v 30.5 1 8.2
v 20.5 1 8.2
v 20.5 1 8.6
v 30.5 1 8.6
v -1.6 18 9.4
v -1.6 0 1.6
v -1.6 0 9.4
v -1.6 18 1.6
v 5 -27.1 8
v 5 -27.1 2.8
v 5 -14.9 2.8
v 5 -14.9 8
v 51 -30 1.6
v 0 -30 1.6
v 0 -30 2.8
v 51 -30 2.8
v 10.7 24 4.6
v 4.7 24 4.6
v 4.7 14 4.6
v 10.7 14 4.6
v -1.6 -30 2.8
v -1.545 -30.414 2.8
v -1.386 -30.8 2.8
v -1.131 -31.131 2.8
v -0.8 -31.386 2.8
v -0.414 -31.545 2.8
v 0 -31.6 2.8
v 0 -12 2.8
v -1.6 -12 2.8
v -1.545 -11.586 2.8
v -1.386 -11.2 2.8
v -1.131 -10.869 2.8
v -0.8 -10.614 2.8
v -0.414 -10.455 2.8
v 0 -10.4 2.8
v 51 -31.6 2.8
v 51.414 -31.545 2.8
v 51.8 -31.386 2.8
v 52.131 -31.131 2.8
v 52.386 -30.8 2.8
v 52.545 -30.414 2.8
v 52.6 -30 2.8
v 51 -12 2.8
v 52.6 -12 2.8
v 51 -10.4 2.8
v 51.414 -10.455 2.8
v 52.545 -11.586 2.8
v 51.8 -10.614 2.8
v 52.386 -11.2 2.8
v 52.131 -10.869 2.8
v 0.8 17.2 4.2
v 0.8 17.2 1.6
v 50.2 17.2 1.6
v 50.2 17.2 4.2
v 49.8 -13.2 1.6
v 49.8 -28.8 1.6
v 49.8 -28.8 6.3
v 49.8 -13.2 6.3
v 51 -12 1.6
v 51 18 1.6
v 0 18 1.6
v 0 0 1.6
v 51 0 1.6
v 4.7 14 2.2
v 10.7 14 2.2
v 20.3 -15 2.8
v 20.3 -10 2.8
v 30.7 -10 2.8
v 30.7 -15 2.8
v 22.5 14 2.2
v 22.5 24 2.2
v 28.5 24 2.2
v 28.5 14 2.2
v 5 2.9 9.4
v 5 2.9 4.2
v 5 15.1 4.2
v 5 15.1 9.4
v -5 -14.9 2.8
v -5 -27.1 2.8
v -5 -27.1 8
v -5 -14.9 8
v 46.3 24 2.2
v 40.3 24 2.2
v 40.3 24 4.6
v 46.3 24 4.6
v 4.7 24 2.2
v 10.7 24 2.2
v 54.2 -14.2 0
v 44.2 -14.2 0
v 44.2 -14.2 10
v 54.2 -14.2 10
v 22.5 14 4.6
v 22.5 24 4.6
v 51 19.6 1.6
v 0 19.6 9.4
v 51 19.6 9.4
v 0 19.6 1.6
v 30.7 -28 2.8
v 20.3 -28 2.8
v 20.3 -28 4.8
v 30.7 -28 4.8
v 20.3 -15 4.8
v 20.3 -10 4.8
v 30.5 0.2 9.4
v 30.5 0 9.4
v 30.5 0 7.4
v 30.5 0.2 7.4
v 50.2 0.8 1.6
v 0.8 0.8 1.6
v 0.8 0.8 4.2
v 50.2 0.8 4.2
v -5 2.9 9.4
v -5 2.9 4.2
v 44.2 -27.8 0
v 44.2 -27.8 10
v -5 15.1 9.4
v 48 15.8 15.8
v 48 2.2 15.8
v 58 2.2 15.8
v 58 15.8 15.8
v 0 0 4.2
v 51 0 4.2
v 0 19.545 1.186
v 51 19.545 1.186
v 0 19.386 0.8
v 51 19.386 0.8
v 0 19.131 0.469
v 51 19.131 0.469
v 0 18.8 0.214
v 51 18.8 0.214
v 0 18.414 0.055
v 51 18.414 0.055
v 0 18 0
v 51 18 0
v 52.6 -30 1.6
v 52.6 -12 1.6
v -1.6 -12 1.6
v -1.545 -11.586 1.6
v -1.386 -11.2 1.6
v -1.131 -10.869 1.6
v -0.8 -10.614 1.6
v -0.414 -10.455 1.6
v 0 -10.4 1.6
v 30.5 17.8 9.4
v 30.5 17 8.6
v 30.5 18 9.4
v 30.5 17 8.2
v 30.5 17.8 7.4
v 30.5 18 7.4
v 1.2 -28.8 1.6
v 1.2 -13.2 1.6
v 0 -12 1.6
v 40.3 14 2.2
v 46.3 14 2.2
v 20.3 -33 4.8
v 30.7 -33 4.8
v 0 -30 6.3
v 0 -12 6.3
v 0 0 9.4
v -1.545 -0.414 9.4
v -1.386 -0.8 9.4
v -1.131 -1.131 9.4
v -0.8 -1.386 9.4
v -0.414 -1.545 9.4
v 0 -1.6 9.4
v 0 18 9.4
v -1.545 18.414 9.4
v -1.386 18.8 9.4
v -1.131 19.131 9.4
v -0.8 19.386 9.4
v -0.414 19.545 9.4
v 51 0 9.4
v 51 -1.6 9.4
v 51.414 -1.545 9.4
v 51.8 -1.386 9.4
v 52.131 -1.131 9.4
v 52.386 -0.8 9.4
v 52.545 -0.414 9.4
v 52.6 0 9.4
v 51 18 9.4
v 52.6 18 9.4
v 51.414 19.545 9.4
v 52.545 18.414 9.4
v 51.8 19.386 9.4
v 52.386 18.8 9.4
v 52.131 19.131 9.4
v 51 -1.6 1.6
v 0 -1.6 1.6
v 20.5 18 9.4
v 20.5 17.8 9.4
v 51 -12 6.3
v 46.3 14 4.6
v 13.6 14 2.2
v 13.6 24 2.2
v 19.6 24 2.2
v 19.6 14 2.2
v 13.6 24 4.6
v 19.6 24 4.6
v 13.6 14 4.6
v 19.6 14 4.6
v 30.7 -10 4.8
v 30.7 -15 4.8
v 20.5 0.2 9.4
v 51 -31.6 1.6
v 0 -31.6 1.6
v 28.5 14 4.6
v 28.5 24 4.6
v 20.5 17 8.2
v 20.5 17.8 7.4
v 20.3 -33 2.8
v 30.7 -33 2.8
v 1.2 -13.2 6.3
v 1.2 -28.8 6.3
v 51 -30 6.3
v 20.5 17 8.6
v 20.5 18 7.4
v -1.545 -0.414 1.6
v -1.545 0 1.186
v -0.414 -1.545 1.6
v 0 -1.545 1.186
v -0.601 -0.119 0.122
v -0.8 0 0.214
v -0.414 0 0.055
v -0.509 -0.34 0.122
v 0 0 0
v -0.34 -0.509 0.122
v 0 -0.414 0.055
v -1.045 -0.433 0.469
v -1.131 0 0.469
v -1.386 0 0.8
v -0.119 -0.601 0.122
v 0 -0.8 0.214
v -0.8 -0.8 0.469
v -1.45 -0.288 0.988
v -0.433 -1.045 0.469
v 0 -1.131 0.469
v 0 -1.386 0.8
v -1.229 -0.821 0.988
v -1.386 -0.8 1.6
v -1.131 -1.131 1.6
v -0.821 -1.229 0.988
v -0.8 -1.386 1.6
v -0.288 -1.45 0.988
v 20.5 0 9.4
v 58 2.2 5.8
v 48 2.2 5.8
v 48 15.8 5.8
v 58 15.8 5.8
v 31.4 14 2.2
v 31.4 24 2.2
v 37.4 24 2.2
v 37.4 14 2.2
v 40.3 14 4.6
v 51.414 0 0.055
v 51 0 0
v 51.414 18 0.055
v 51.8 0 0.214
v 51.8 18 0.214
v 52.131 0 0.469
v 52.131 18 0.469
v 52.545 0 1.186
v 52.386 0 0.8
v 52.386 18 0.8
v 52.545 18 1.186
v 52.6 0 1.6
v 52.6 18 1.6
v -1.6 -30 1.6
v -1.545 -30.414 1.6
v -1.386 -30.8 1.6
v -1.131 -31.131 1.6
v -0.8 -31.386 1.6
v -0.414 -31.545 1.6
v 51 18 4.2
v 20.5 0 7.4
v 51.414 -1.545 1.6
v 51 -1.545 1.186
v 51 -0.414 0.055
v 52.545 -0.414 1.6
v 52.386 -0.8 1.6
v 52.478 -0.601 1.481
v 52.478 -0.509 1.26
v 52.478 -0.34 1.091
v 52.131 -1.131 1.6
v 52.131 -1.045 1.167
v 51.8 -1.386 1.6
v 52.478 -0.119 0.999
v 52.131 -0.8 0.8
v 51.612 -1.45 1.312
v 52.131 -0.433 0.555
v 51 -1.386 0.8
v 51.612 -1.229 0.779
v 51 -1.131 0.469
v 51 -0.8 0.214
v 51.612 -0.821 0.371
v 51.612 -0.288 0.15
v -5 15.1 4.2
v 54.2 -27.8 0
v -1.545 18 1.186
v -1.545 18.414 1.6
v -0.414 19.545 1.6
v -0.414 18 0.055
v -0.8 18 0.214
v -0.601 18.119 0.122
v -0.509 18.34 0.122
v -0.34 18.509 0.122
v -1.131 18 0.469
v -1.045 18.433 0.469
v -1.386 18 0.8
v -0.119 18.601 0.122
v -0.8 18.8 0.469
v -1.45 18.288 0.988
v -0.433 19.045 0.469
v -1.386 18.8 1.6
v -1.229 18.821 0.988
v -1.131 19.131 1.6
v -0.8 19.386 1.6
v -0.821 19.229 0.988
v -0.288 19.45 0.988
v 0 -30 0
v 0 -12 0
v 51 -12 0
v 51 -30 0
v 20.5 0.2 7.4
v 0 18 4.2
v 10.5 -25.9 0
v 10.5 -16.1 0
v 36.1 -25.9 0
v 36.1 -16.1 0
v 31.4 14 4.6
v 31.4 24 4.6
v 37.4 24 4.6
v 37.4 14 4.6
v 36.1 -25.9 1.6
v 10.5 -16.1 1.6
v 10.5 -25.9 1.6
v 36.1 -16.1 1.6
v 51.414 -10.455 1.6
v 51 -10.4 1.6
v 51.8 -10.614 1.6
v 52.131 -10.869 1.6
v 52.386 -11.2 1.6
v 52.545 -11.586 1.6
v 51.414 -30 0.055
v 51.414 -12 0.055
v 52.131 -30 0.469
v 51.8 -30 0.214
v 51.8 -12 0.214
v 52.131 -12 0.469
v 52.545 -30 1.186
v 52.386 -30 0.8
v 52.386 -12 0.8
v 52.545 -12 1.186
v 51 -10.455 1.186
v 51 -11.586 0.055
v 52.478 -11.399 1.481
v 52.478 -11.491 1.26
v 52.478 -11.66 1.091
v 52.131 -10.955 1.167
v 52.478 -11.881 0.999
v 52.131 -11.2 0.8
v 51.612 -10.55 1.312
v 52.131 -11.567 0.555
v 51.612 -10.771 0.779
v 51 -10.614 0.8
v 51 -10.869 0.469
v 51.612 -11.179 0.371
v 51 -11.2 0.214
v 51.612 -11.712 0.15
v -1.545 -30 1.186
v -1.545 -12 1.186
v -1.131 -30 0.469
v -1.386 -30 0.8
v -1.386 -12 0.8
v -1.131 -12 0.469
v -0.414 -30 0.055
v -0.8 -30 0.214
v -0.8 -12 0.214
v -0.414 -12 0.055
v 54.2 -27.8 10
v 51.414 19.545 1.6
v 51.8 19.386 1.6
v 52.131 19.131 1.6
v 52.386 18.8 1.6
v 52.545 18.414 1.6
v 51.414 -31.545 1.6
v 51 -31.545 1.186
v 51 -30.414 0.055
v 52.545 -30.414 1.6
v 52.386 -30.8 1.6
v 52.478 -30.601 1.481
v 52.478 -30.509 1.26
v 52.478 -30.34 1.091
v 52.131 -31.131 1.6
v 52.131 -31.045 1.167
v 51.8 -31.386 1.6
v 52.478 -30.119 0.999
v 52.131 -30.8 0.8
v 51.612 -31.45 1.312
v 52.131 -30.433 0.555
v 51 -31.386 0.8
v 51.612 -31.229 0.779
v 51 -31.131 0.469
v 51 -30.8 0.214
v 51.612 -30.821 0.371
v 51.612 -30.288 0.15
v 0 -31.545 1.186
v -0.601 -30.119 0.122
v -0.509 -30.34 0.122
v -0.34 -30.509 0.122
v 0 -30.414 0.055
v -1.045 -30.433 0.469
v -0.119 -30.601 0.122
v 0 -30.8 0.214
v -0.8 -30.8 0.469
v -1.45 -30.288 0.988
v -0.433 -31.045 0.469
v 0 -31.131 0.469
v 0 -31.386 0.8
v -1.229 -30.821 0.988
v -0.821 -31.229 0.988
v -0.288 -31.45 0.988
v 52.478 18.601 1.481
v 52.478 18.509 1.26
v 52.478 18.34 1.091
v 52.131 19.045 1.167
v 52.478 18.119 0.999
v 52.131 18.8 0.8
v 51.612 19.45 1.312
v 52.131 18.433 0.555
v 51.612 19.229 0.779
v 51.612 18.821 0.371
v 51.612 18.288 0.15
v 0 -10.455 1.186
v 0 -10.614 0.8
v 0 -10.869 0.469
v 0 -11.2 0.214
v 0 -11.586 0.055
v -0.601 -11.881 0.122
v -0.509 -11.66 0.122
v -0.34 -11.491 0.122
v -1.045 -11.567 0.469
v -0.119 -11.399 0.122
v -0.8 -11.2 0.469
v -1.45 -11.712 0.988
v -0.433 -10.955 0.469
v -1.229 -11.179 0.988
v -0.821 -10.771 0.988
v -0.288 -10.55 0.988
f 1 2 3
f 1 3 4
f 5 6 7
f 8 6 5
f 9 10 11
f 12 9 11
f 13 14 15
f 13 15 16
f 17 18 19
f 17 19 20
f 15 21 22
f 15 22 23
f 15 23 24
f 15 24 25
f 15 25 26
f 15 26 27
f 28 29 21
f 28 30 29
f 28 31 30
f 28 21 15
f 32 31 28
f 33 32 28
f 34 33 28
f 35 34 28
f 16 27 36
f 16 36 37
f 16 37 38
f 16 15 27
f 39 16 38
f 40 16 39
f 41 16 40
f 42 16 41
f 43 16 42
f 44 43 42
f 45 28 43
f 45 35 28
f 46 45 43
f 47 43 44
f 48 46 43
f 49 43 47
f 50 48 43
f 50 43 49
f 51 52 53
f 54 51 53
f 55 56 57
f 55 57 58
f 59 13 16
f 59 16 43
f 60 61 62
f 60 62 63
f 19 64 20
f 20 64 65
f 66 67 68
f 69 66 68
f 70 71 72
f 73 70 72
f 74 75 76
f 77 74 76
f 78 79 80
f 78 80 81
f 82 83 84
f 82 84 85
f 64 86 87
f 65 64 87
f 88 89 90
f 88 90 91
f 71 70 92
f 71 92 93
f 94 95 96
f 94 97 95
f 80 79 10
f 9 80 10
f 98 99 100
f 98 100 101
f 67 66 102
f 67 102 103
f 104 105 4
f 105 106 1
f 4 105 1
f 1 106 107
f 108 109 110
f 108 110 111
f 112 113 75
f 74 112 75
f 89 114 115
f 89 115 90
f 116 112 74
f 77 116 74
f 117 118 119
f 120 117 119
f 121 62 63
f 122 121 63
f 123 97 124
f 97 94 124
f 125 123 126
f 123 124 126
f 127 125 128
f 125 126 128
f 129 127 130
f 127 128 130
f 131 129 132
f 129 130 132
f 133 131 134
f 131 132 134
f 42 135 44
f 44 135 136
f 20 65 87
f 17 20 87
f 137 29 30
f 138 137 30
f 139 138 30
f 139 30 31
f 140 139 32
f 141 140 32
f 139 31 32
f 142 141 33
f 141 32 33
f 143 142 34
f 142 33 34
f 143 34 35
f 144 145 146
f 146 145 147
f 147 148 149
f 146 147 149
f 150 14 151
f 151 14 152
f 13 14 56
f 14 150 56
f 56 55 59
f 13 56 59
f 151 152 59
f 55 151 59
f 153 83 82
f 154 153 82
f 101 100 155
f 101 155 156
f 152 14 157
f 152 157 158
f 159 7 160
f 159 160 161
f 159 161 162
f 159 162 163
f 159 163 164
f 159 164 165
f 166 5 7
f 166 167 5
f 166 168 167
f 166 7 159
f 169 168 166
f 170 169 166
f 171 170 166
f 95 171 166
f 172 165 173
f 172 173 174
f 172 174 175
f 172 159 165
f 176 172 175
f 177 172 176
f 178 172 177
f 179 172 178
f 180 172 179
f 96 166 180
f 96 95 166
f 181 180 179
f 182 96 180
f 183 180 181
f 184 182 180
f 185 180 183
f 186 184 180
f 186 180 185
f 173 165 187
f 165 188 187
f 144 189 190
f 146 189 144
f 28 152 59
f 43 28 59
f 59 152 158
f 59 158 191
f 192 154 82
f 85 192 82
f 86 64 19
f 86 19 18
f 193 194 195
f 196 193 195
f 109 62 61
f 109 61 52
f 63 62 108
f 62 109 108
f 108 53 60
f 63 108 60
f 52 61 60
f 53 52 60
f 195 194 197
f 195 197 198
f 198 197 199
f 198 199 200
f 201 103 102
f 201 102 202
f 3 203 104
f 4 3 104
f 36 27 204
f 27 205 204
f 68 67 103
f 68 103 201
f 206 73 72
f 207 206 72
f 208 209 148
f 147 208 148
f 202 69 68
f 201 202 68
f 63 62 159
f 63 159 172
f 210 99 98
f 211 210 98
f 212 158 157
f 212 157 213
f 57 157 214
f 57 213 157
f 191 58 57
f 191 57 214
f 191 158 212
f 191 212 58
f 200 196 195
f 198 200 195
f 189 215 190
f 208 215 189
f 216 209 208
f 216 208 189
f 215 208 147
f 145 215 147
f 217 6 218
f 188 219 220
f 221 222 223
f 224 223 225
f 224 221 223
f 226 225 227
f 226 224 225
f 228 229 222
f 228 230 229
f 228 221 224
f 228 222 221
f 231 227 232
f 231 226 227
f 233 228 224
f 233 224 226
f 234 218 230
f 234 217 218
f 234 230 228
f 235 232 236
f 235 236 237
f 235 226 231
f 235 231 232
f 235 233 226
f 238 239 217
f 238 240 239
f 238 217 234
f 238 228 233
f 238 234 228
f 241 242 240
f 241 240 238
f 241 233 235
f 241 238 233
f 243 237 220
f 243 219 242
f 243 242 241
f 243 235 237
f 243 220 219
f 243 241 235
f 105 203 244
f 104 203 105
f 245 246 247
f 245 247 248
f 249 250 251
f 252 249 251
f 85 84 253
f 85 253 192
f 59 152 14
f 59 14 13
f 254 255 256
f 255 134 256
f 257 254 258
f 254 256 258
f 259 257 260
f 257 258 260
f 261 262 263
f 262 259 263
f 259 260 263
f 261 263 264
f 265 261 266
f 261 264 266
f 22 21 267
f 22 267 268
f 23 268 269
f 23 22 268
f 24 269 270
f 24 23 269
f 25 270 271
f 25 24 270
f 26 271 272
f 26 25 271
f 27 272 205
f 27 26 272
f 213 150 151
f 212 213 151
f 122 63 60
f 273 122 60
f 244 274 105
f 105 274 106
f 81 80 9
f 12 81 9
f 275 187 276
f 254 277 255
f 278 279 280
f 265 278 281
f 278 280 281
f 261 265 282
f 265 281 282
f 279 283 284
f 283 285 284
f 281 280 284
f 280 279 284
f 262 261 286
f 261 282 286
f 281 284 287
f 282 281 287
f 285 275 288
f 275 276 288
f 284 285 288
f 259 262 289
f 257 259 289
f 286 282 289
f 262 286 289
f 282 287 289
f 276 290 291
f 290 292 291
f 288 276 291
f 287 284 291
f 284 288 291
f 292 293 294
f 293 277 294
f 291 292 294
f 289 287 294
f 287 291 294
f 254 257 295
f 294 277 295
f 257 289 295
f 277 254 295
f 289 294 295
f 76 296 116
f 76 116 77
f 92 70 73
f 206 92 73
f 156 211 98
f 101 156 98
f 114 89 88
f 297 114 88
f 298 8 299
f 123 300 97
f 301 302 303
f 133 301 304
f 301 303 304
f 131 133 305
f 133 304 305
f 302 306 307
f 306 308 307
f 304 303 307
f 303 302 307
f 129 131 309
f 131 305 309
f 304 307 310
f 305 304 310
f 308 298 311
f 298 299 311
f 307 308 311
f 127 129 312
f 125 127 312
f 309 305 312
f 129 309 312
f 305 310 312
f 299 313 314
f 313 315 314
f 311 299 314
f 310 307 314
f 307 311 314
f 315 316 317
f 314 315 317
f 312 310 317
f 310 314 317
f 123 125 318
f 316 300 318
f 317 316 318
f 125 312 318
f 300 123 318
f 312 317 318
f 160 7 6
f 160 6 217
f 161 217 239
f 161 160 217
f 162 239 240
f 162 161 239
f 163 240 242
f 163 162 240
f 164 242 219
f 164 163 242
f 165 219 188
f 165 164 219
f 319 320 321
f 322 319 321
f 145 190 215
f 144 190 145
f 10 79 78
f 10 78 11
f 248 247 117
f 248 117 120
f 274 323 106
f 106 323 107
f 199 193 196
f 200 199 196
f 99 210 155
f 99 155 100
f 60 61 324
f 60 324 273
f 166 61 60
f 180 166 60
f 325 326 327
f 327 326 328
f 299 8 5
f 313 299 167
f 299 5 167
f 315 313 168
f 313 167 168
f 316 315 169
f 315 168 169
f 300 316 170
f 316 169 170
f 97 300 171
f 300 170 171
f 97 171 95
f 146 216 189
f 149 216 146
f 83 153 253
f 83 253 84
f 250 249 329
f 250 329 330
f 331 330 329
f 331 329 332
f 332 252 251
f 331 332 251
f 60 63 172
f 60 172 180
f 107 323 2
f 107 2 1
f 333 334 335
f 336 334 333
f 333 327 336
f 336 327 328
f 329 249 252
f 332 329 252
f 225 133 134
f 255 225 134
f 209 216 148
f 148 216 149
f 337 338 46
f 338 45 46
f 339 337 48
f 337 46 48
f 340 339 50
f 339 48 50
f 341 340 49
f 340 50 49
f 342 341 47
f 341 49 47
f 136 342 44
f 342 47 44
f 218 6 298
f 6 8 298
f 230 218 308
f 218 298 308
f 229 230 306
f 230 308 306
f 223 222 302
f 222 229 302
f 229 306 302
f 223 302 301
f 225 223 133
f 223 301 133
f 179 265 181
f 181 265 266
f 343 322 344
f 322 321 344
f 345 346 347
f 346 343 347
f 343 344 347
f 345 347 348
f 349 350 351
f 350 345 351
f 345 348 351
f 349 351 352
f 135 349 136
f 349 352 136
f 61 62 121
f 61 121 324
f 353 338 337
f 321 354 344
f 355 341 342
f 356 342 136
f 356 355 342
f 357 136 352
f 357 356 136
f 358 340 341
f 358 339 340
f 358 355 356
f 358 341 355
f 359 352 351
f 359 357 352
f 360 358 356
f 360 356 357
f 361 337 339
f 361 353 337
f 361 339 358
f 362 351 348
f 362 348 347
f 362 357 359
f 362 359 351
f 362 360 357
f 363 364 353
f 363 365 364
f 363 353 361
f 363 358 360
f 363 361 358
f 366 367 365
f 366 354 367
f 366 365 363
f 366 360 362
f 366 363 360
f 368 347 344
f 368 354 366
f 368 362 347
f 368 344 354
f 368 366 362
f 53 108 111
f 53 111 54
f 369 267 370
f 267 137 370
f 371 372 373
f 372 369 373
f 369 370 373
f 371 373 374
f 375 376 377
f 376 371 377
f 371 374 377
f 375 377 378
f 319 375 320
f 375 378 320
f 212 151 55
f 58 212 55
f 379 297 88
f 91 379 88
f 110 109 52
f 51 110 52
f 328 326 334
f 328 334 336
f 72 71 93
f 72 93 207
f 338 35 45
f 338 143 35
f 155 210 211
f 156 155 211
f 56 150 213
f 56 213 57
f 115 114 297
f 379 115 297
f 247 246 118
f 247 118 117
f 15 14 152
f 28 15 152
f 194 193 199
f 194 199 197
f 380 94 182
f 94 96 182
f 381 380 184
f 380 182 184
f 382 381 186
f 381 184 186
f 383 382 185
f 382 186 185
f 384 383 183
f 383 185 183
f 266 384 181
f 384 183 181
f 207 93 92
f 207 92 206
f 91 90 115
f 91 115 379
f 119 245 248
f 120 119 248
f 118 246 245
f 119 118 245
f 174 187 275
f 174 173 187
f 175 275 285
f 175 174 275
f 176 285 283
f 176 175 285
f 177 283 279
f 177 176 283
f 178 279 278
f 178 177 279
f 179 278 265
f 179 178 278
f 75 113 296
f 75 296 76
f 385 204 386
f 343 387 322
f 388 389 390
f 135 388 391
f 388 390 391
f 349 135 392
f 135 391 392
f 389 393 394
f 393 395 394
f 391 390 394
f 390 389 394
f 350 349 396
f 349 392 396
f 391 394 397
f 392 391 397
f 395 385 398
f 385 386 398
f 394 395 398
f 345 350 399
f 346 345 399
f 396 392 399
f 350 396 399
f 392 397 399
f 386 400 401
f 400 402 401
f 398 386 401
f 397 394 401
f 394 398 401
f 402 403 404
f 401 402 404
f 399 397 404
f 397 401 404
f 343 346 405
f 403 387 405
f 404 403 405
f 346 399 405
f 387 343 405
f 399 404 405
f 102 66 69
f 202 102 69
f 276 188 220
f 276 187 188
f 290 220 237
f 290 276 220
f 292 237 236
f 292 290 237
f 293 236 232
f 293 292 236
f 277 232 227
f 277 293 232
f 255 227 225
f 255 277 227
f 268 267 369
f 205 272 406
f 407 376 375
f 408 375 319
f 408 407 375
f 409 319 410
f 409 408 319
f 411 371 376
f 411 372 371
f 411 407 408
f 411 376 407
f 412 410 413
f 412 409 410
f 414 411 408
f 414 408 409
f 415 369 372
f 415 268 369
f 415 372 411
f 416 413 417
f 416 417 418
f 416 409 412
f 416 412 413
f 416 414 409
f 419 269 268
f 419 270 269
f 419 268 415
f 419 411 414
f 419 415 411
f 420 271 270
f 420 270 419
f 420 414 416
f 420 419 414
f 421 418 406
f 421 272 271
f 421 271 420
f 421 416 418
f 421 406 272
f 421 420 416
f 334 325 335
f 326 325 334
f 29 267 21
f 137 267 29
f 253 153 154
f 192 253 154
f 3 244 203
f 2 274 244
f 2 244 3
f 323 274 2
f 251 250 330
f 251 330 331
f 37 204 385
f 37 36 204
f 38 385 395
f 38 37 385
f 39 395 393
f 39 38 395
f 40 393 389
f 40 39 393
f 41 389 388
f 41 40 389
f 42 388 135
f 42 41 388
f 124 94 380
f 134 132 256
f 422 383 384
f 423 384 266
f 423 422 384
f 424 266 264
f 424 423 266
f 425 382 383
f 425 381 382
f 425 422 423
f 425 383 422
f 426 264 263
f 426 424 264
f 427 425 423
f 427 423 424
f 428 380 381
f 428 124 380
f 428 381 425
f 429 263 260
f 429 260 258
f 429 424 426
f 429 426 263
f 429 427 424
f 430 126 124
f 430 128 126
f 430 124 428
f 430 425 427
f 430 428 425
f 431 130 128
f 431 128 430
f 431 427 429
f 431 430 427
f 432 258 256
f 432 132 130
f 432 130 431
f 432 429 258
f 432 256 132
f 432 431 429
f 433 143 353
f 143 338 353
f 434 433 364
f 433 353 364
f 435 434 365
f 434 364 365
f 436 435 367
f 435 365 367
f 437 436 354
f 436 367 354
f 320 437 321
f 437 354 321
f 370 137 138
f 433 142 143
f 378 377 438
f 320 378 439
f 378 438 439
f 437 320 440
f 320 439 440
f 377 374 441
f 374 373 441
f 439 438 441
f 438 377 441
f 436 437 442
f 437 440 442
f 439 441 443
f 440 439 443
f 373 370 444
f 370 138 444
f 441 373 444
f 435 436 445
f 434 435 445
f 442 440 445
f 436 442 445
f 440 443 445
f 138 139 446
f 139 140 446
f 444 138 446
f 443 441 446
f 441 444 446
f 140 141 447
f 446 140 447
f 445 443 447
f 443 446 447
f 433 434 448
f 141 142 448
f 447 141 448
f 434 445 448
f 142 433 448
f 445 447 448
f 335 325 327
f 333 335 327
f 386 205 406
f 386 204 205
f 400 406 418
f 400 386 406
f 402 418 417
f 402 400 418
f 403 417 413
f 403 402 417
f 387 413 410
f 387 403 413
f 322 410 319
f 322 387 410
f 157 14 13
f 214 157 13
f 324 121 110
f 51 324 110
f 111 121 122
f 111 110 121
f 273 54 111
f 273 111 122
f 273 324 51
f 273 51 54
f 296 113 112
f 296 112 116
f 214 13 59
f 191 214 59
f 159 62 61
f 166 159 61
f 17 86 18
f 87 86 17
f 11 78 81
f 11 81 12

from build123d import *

# Parameters (mm, degrees)
BOX001_W        = 51
BOX001_H        = 18
BOX001_DEPTH    = 9.4
BOX_W           = 54.2
BOX_H           = 21.2
BOX_DEPTH       = 9.4
FILLET_R        = 1.6
BOX003_W        = 49.4
BOX003_H        = 16.4
BOX003_DEPTH    = 2.6
BOX002_W        = 51
BOX002_H        = 18
BOX002_DEPTH    = 2.6
BOX004_W        = 10
BOX004_H        = 1
BOX004_DEPTH    = 2
CHAMFER_SIZE    = 0.8
BOX005_W        = 10
BOX005_H        = 1
BOX005_DEPTH    = 2
CHAMFER001_SIZE = 0.8
BOX006_W        = 10
BOX006_H        = 12.2
BOX006_DEPTH    = 5.2
BOX007_W        = 10
BOX007_H        = 13.6
BOX007_DEPTH    = 10
BOX008_W        = 6
BOX008_H        = 10
BOX008_DEPTH    = 2.4
BOX009_W        = 6
BOX009_H        = 10
BOX009_DEPTH    = 2.4
BOX011_W        = 51
BOX011_H        = 18
BOX011_DEPTH    = 9.4
BOX010_W        = 54.2
BOX010_H        = 21.2
BOX010_DEPTH    = 2.8
FILLET001_R     = 1.6
BOX013_W        = 48.6
BOX013_H        = 15.6
BOX013_DEPTH    = 4.8
BOX012_W        = 51
BOX012_H        = 18
BOX012_DEPTH    = 4.7
BOX014_W        = 25.6
BOX014_H        = 9.8
BOX014_DEPTH    = 1.6
BOX015_W        = 10
BOX015_H        = 12.2
BOX015_DEPTH    = 5.2
BOX016_W        = 10
BOX016_H        = 13.6
BOX016_DEPTH    = 10
BOX017_W        = 10.4
BOX017_H        = 5
BOX017_DEPTH    = 2
BOX018_W        = 10.4
BOX018_H        = 5
BOX018_DEPTH    = 2
BOX019_W        = 6
BOX019_H        = 10
BOX019_DEPTH    = 2.4
BOX020_W        = 6
BOX020_H        = 10
BOX020_DEPTH    = 2.4
BOX021_W        = 6
BOX021_H        = 10
BOX021_DEPTH    = 2.4


with BuildPart() as unten_innen:
    # Box001 → Box001 (new body)
    with BuildSketch(Plane.XY.offset(1.6)):
        with Locations((25.5, 9)):
            Rectangle(BOX001_W, BOX001_H)
    extrude(amount=BOX001_DEPTH)


with BuildPart() as schale_unten:
    # Box → Box (new body)
    with BuildSketch(Plane(origin=(-1.6, -1.6, 0), x_dir=(1, 0, 0), z_dir=(0, 0, 1))):
        with Locations((27.1, 10.6)):
            Rectangle(BOX_W, BOX_H)
    extrude(amount=BOX_DEPTH)

    # Cut: cut unten_innen
    add(unten_innen.part, mode=Mode.SUBTRACT)

    # Fillet
    fillet_edges = [schale_unten.edges().sort_by_distance(p)[0] for p in [
        (-1.6, -1.6, 4.7),
        (-1.6, 19.6, 4.7),
        (-1.6, 9, 0),
        (25.5, -1.6, 0),
        (52.6, -1.6, 4.7),
        (25.5, 19.6, 0),
        (52.6, 19.6, 4.7),
        (52.6, 9, 0),
    ]]
    fillet(fillet_edges, radius=FILLET_R)


with BuildPart() as auflage_innen:
    # Box003 → Box003 (new body)
    with BuildSketch(Plane(origin=(0.8, 0.8, 1.6), x_dir=(1, 0, 0), z_dir=(0, 0, 1))):
        with Locations((24.7, 8.2)):
            Rectangle(BOX003_W, BOX003_H)
    extrude(amount=BOX003_DEPTH)


with BuildPart() as auflage:
    # Box002 → Box002 (new body)
    with BuildSketch(Plane.XY.offset(1.6)):
        with Locations((25.5, 9)):
            Rectangle(BOX002_W, BOX002_H)
    extrude(amount=BOX002_DEPTH)

    # Cut001: cut Auflage_innen
    add(auflage_innen.part, mode=Mode.SUBTRACT)


with BuildPart() as haken1:
    # Box004 → Box004 (new body)
    with BuildSketch(Plane(origin=(20.5, 0, 7.4), x_dir=(1, 0, 0), z_dir=(0, 0, 1))):
        with Locations((5, 0.5)):
            Rectangle(BOX004_W, BOX004_H)
    extrude(amount=BOX004_DEPTH)

    # Chamfer
    chamfer_edges = [haken1.edges().sort_by_distance(p)[0] for p in [
        (25.5, 1, 7.4),
        (25.5, 1, 9.4),
    ]]
    chamfer(chamfer_edges, length=CHAMFER_SIZE)


with BuildPart() as haken2:
    # Box005 → Box005 (new body)
    with BuildSketch(Plane(origin=(20.5, 17, 7.4), x_dir=(1, 0, 0), z_dir=(0, 0, 1))):
        with Locations((5, 0.5)):
            Rectangle(BOX005_W, BOX005_H)
    extrude(amount=BOX005_DEPTH)

    # Chamfer001
    chamfer001_edges = [haken2.edges().sort_by_distance(p)[0] for p in [
        (25.5, 17, 7.4),
        (25.5, 17, 9.4),
    ]]
    chamfer(chamfer001_edges, length=CHAMFER001_SIZE)


with BuildPart() as usb_stecker:
    # Box006 → Box006 (new body)
    with BuildSketch(Plane(origin=(-5, 2.9, 4.2), x_dir=(1, 0, 0), z_dir=(0, 0, 1))):
        with Locations((5, 6.1)):
            Rectangle(BOX006_W, BOX006_H)
    extrude(amount=BOX006_DEPTH)


with BuildPart() as usb_buchse:
    # Box007 → Box007 (new body)
    with BuildSketch(Plane(origin=(48, 2.2, 5.8), x_dir=(1, 0, 0), z_dir=(0, 0, 1))):
        with Locations((5, 6.8)):
            Rectangle(BOX007_W, BOX007_H)
    extrude(amount=BOX007_DEPTH)


with BuildPart() as button1:
    # Box008 → Box008 (new body)
    with BuildSketch(Plane(origin=(4.7, 14, 2.2), x_dir=(1, 0, 0), z_dir=(0, 0, 1))):
        with Locations((3, 5)):
            Rectangle(BOX008_W, BOX008_H)
    extrude(amount=BOX008_DEPTH)


with BuildPart() as button2:
    # Box009 → Box009 (new body)
    with BuildSketch(Plane(origin=(13.6, 14, 2.2), x_dir=(1, 0, 0), z_dir=(0, 0, 1))):
        with Locations((3, 5)):
            Rectangle(BOX009_W, BOX009_H)
    extrude(amount=BOX009_DEPTH)


with BuildPart() as oben_innen:
    # Box011 → Box011 (new body)
    with BuildSketch(Plane(origin=(0, -30, 1.6), x_dir=(1, 0, 0), z_dir=(0, 0, 1))):
        with Locations((25.5, 9)):
            Rectangle(BOX011_W, BOX011_H)
    extrude(amount=BOX011_DEPTH)


with BuildPart() as schale_oben:
    # Box010 → Box010 (new body)
    with BuildSketch(Plane(origin=(-1.6, -31.6, 0), x_dir=(1, 0, 0), z_dir=(0, 0, 1))):
        with Locations((27.1, 10.6)):
            Rectangle(BOX010_W, BOX010_H)
    extrude(amount=BOX010_DEPTH)

    # Cut002: cut oben_innen
    add(oben_innen.part, mode=Mode.SUBTRACT)

    # Fillet001
    fillet001_edges = [schale_oben.edges().sort_by_distance(p)[0] for p in [
        (-1.6, -31.6, 1.4),
        (-1.6, -10.4, 1.4),
        (-1.6, -21, 0),
        (25.5, -31.6, 0),
        (52.6, -31.6, 1.4),
        (25.5, -10.4, 0),
        (52.6, -10.4, 1.4),
        (52.6, -21, 0),
    ]]
    fillet(fillet001_edges, radius=FILLET001_R)


with BuildPart() as rahmen_innen:
    # Box013 → Box013 (new body)
    with BuildSketch(Plane(origin=(1.2, -28.8, 1.6), x_dir=(1, 0, 0), z_dir=(0, 0, 1))):
        with Locations((24.3, 7.8)):
            Rectangle(BOX013_W, BOX013_H)
    extrude(amount=BOX013_DEPTH)


with BuildPart() as rahmen:
    # Box012 → Box012 (new body)
    with BuildSketch(Plane(origin=(0, -30, 1.6), x_dir=(1, 0, 0), z_dir=(0, 0, 1))):
        with Locations((25.5, 9)):
            Rectangle(BOX012_W, BOX012_H)
    extrude(amount=BOX012_DEPTH)

    # Cut003: cut Rahmen_innen
    add(rahmen_innen.part, mode=Mode.SUBTRACT)


with BuildPart() as oled:
    # Box014 → Box014 (new body)
    with BuildSketch(Plane(origin=(10.5, -25.9, 0), x_dir=(1, 0, 0), z_dir=(0, 0, 1))):
        with Locations((12.8, 4.9)):
            Rectangle(BOX014_W, BOX014_H)
    extrude(amount=BOX014_DEPTH)


with BuildPart() as usb_stecker2:
    # Box015 → Box015 (new body)
    with BuildSketch(Plane(origin=(-5, -27.1, 2.8), x_dir=(1, 0, 0), z_dir=(0, 0, 1))):
        with Locations((5, 6.1)):
            Rectangle(BOX015_W, BOX015_H)
    extrude(amount=BOX015_DEPTH)


with BuildPart() as usb_buchse2:
    # Box016 → Box016 (new body)
    with BuildSketch(Plane(origin=(44.2, -27.8, 0), x_dir=(1, 0, 0), z_dir=(0, 0, 1))):
        with Locations((5, 6.8)):
            Rectangle(BOX016_W, BOX016_H)
    extrude(amount=BOX016_DEPTH)


with BuildPart() as oese1:
    # Box017 → Box017 (new body)
    with BuildSketch(Plane(origin=(20.3, -33, 2.8), x_dir=(1, 0, 0), z_dir=(0, 0, 1))):
        with Locations((5.2, 2.5)):
            Rectangle(BOX017_W, BOX017_H)
    extrude(amount=BOX017_DEPTH)


with BuildPart() as oese2:
    # Box018 → Box018 (new body)
    with BuildSketch(Plane(origin=(20.3, -15, 2.8), x_dir=(1, 0, 0), z_dir=(0, 0, 1))):
        with Locations((5.2, 2.5)):
            Rectangle(BOX018_W, BOX018_H)
    extrude(amount=BOX018_DEPTH)


with BuildPart() as button3:
    # Box019 → Box019 (new body)
    with BuildSketch(Plane(origin=(22.5, 14, 2.2), x_dir=(1, 0, 0), z_dir=(0, 0, 1))):
        with Locations((3, 5)):
            Rectangle(BOX019_W, BOX019_H)
    extrude(amount=BOX019_DEPTH)


with BuildPart() as button4:
    # Box020 → Box020 (new body)
    with BuildSketch(Plane(origin=(31.4, 14, 2.2), x_dir=(1, 0, 0), z_dir=(0, 0, 1))):
        with Locations((3, 5)):
            Rectangle(BOX020_W, BOX020_H)
    extrude(amount=BOX020_DEPTH)


with BuildPart() as button5:
    # Box021 → Box021 (new body)
    with BuildSketch(Plane(origin=(40.3, 14, 2.2), x_dir=(1, 0, 0), z_dir=(0, 0, 1))):
        with Locations((3, 5)):
            Rectangle(BOX021_W, BOX021_H)
    extrude(amount=BOX021_DEPTH)


solid = Compound([schale_unten.part, auflage.part, haken1.part, haken2.part, usb_stecker.part, usb_buchse.part, button1.part, button2.part, schale_oben.part, rahmen.part, oled.part, usb_stecker2.part, usb_buchse2.part, oese1.part, oese2.part, button3.part, button4.part, button5.part])
